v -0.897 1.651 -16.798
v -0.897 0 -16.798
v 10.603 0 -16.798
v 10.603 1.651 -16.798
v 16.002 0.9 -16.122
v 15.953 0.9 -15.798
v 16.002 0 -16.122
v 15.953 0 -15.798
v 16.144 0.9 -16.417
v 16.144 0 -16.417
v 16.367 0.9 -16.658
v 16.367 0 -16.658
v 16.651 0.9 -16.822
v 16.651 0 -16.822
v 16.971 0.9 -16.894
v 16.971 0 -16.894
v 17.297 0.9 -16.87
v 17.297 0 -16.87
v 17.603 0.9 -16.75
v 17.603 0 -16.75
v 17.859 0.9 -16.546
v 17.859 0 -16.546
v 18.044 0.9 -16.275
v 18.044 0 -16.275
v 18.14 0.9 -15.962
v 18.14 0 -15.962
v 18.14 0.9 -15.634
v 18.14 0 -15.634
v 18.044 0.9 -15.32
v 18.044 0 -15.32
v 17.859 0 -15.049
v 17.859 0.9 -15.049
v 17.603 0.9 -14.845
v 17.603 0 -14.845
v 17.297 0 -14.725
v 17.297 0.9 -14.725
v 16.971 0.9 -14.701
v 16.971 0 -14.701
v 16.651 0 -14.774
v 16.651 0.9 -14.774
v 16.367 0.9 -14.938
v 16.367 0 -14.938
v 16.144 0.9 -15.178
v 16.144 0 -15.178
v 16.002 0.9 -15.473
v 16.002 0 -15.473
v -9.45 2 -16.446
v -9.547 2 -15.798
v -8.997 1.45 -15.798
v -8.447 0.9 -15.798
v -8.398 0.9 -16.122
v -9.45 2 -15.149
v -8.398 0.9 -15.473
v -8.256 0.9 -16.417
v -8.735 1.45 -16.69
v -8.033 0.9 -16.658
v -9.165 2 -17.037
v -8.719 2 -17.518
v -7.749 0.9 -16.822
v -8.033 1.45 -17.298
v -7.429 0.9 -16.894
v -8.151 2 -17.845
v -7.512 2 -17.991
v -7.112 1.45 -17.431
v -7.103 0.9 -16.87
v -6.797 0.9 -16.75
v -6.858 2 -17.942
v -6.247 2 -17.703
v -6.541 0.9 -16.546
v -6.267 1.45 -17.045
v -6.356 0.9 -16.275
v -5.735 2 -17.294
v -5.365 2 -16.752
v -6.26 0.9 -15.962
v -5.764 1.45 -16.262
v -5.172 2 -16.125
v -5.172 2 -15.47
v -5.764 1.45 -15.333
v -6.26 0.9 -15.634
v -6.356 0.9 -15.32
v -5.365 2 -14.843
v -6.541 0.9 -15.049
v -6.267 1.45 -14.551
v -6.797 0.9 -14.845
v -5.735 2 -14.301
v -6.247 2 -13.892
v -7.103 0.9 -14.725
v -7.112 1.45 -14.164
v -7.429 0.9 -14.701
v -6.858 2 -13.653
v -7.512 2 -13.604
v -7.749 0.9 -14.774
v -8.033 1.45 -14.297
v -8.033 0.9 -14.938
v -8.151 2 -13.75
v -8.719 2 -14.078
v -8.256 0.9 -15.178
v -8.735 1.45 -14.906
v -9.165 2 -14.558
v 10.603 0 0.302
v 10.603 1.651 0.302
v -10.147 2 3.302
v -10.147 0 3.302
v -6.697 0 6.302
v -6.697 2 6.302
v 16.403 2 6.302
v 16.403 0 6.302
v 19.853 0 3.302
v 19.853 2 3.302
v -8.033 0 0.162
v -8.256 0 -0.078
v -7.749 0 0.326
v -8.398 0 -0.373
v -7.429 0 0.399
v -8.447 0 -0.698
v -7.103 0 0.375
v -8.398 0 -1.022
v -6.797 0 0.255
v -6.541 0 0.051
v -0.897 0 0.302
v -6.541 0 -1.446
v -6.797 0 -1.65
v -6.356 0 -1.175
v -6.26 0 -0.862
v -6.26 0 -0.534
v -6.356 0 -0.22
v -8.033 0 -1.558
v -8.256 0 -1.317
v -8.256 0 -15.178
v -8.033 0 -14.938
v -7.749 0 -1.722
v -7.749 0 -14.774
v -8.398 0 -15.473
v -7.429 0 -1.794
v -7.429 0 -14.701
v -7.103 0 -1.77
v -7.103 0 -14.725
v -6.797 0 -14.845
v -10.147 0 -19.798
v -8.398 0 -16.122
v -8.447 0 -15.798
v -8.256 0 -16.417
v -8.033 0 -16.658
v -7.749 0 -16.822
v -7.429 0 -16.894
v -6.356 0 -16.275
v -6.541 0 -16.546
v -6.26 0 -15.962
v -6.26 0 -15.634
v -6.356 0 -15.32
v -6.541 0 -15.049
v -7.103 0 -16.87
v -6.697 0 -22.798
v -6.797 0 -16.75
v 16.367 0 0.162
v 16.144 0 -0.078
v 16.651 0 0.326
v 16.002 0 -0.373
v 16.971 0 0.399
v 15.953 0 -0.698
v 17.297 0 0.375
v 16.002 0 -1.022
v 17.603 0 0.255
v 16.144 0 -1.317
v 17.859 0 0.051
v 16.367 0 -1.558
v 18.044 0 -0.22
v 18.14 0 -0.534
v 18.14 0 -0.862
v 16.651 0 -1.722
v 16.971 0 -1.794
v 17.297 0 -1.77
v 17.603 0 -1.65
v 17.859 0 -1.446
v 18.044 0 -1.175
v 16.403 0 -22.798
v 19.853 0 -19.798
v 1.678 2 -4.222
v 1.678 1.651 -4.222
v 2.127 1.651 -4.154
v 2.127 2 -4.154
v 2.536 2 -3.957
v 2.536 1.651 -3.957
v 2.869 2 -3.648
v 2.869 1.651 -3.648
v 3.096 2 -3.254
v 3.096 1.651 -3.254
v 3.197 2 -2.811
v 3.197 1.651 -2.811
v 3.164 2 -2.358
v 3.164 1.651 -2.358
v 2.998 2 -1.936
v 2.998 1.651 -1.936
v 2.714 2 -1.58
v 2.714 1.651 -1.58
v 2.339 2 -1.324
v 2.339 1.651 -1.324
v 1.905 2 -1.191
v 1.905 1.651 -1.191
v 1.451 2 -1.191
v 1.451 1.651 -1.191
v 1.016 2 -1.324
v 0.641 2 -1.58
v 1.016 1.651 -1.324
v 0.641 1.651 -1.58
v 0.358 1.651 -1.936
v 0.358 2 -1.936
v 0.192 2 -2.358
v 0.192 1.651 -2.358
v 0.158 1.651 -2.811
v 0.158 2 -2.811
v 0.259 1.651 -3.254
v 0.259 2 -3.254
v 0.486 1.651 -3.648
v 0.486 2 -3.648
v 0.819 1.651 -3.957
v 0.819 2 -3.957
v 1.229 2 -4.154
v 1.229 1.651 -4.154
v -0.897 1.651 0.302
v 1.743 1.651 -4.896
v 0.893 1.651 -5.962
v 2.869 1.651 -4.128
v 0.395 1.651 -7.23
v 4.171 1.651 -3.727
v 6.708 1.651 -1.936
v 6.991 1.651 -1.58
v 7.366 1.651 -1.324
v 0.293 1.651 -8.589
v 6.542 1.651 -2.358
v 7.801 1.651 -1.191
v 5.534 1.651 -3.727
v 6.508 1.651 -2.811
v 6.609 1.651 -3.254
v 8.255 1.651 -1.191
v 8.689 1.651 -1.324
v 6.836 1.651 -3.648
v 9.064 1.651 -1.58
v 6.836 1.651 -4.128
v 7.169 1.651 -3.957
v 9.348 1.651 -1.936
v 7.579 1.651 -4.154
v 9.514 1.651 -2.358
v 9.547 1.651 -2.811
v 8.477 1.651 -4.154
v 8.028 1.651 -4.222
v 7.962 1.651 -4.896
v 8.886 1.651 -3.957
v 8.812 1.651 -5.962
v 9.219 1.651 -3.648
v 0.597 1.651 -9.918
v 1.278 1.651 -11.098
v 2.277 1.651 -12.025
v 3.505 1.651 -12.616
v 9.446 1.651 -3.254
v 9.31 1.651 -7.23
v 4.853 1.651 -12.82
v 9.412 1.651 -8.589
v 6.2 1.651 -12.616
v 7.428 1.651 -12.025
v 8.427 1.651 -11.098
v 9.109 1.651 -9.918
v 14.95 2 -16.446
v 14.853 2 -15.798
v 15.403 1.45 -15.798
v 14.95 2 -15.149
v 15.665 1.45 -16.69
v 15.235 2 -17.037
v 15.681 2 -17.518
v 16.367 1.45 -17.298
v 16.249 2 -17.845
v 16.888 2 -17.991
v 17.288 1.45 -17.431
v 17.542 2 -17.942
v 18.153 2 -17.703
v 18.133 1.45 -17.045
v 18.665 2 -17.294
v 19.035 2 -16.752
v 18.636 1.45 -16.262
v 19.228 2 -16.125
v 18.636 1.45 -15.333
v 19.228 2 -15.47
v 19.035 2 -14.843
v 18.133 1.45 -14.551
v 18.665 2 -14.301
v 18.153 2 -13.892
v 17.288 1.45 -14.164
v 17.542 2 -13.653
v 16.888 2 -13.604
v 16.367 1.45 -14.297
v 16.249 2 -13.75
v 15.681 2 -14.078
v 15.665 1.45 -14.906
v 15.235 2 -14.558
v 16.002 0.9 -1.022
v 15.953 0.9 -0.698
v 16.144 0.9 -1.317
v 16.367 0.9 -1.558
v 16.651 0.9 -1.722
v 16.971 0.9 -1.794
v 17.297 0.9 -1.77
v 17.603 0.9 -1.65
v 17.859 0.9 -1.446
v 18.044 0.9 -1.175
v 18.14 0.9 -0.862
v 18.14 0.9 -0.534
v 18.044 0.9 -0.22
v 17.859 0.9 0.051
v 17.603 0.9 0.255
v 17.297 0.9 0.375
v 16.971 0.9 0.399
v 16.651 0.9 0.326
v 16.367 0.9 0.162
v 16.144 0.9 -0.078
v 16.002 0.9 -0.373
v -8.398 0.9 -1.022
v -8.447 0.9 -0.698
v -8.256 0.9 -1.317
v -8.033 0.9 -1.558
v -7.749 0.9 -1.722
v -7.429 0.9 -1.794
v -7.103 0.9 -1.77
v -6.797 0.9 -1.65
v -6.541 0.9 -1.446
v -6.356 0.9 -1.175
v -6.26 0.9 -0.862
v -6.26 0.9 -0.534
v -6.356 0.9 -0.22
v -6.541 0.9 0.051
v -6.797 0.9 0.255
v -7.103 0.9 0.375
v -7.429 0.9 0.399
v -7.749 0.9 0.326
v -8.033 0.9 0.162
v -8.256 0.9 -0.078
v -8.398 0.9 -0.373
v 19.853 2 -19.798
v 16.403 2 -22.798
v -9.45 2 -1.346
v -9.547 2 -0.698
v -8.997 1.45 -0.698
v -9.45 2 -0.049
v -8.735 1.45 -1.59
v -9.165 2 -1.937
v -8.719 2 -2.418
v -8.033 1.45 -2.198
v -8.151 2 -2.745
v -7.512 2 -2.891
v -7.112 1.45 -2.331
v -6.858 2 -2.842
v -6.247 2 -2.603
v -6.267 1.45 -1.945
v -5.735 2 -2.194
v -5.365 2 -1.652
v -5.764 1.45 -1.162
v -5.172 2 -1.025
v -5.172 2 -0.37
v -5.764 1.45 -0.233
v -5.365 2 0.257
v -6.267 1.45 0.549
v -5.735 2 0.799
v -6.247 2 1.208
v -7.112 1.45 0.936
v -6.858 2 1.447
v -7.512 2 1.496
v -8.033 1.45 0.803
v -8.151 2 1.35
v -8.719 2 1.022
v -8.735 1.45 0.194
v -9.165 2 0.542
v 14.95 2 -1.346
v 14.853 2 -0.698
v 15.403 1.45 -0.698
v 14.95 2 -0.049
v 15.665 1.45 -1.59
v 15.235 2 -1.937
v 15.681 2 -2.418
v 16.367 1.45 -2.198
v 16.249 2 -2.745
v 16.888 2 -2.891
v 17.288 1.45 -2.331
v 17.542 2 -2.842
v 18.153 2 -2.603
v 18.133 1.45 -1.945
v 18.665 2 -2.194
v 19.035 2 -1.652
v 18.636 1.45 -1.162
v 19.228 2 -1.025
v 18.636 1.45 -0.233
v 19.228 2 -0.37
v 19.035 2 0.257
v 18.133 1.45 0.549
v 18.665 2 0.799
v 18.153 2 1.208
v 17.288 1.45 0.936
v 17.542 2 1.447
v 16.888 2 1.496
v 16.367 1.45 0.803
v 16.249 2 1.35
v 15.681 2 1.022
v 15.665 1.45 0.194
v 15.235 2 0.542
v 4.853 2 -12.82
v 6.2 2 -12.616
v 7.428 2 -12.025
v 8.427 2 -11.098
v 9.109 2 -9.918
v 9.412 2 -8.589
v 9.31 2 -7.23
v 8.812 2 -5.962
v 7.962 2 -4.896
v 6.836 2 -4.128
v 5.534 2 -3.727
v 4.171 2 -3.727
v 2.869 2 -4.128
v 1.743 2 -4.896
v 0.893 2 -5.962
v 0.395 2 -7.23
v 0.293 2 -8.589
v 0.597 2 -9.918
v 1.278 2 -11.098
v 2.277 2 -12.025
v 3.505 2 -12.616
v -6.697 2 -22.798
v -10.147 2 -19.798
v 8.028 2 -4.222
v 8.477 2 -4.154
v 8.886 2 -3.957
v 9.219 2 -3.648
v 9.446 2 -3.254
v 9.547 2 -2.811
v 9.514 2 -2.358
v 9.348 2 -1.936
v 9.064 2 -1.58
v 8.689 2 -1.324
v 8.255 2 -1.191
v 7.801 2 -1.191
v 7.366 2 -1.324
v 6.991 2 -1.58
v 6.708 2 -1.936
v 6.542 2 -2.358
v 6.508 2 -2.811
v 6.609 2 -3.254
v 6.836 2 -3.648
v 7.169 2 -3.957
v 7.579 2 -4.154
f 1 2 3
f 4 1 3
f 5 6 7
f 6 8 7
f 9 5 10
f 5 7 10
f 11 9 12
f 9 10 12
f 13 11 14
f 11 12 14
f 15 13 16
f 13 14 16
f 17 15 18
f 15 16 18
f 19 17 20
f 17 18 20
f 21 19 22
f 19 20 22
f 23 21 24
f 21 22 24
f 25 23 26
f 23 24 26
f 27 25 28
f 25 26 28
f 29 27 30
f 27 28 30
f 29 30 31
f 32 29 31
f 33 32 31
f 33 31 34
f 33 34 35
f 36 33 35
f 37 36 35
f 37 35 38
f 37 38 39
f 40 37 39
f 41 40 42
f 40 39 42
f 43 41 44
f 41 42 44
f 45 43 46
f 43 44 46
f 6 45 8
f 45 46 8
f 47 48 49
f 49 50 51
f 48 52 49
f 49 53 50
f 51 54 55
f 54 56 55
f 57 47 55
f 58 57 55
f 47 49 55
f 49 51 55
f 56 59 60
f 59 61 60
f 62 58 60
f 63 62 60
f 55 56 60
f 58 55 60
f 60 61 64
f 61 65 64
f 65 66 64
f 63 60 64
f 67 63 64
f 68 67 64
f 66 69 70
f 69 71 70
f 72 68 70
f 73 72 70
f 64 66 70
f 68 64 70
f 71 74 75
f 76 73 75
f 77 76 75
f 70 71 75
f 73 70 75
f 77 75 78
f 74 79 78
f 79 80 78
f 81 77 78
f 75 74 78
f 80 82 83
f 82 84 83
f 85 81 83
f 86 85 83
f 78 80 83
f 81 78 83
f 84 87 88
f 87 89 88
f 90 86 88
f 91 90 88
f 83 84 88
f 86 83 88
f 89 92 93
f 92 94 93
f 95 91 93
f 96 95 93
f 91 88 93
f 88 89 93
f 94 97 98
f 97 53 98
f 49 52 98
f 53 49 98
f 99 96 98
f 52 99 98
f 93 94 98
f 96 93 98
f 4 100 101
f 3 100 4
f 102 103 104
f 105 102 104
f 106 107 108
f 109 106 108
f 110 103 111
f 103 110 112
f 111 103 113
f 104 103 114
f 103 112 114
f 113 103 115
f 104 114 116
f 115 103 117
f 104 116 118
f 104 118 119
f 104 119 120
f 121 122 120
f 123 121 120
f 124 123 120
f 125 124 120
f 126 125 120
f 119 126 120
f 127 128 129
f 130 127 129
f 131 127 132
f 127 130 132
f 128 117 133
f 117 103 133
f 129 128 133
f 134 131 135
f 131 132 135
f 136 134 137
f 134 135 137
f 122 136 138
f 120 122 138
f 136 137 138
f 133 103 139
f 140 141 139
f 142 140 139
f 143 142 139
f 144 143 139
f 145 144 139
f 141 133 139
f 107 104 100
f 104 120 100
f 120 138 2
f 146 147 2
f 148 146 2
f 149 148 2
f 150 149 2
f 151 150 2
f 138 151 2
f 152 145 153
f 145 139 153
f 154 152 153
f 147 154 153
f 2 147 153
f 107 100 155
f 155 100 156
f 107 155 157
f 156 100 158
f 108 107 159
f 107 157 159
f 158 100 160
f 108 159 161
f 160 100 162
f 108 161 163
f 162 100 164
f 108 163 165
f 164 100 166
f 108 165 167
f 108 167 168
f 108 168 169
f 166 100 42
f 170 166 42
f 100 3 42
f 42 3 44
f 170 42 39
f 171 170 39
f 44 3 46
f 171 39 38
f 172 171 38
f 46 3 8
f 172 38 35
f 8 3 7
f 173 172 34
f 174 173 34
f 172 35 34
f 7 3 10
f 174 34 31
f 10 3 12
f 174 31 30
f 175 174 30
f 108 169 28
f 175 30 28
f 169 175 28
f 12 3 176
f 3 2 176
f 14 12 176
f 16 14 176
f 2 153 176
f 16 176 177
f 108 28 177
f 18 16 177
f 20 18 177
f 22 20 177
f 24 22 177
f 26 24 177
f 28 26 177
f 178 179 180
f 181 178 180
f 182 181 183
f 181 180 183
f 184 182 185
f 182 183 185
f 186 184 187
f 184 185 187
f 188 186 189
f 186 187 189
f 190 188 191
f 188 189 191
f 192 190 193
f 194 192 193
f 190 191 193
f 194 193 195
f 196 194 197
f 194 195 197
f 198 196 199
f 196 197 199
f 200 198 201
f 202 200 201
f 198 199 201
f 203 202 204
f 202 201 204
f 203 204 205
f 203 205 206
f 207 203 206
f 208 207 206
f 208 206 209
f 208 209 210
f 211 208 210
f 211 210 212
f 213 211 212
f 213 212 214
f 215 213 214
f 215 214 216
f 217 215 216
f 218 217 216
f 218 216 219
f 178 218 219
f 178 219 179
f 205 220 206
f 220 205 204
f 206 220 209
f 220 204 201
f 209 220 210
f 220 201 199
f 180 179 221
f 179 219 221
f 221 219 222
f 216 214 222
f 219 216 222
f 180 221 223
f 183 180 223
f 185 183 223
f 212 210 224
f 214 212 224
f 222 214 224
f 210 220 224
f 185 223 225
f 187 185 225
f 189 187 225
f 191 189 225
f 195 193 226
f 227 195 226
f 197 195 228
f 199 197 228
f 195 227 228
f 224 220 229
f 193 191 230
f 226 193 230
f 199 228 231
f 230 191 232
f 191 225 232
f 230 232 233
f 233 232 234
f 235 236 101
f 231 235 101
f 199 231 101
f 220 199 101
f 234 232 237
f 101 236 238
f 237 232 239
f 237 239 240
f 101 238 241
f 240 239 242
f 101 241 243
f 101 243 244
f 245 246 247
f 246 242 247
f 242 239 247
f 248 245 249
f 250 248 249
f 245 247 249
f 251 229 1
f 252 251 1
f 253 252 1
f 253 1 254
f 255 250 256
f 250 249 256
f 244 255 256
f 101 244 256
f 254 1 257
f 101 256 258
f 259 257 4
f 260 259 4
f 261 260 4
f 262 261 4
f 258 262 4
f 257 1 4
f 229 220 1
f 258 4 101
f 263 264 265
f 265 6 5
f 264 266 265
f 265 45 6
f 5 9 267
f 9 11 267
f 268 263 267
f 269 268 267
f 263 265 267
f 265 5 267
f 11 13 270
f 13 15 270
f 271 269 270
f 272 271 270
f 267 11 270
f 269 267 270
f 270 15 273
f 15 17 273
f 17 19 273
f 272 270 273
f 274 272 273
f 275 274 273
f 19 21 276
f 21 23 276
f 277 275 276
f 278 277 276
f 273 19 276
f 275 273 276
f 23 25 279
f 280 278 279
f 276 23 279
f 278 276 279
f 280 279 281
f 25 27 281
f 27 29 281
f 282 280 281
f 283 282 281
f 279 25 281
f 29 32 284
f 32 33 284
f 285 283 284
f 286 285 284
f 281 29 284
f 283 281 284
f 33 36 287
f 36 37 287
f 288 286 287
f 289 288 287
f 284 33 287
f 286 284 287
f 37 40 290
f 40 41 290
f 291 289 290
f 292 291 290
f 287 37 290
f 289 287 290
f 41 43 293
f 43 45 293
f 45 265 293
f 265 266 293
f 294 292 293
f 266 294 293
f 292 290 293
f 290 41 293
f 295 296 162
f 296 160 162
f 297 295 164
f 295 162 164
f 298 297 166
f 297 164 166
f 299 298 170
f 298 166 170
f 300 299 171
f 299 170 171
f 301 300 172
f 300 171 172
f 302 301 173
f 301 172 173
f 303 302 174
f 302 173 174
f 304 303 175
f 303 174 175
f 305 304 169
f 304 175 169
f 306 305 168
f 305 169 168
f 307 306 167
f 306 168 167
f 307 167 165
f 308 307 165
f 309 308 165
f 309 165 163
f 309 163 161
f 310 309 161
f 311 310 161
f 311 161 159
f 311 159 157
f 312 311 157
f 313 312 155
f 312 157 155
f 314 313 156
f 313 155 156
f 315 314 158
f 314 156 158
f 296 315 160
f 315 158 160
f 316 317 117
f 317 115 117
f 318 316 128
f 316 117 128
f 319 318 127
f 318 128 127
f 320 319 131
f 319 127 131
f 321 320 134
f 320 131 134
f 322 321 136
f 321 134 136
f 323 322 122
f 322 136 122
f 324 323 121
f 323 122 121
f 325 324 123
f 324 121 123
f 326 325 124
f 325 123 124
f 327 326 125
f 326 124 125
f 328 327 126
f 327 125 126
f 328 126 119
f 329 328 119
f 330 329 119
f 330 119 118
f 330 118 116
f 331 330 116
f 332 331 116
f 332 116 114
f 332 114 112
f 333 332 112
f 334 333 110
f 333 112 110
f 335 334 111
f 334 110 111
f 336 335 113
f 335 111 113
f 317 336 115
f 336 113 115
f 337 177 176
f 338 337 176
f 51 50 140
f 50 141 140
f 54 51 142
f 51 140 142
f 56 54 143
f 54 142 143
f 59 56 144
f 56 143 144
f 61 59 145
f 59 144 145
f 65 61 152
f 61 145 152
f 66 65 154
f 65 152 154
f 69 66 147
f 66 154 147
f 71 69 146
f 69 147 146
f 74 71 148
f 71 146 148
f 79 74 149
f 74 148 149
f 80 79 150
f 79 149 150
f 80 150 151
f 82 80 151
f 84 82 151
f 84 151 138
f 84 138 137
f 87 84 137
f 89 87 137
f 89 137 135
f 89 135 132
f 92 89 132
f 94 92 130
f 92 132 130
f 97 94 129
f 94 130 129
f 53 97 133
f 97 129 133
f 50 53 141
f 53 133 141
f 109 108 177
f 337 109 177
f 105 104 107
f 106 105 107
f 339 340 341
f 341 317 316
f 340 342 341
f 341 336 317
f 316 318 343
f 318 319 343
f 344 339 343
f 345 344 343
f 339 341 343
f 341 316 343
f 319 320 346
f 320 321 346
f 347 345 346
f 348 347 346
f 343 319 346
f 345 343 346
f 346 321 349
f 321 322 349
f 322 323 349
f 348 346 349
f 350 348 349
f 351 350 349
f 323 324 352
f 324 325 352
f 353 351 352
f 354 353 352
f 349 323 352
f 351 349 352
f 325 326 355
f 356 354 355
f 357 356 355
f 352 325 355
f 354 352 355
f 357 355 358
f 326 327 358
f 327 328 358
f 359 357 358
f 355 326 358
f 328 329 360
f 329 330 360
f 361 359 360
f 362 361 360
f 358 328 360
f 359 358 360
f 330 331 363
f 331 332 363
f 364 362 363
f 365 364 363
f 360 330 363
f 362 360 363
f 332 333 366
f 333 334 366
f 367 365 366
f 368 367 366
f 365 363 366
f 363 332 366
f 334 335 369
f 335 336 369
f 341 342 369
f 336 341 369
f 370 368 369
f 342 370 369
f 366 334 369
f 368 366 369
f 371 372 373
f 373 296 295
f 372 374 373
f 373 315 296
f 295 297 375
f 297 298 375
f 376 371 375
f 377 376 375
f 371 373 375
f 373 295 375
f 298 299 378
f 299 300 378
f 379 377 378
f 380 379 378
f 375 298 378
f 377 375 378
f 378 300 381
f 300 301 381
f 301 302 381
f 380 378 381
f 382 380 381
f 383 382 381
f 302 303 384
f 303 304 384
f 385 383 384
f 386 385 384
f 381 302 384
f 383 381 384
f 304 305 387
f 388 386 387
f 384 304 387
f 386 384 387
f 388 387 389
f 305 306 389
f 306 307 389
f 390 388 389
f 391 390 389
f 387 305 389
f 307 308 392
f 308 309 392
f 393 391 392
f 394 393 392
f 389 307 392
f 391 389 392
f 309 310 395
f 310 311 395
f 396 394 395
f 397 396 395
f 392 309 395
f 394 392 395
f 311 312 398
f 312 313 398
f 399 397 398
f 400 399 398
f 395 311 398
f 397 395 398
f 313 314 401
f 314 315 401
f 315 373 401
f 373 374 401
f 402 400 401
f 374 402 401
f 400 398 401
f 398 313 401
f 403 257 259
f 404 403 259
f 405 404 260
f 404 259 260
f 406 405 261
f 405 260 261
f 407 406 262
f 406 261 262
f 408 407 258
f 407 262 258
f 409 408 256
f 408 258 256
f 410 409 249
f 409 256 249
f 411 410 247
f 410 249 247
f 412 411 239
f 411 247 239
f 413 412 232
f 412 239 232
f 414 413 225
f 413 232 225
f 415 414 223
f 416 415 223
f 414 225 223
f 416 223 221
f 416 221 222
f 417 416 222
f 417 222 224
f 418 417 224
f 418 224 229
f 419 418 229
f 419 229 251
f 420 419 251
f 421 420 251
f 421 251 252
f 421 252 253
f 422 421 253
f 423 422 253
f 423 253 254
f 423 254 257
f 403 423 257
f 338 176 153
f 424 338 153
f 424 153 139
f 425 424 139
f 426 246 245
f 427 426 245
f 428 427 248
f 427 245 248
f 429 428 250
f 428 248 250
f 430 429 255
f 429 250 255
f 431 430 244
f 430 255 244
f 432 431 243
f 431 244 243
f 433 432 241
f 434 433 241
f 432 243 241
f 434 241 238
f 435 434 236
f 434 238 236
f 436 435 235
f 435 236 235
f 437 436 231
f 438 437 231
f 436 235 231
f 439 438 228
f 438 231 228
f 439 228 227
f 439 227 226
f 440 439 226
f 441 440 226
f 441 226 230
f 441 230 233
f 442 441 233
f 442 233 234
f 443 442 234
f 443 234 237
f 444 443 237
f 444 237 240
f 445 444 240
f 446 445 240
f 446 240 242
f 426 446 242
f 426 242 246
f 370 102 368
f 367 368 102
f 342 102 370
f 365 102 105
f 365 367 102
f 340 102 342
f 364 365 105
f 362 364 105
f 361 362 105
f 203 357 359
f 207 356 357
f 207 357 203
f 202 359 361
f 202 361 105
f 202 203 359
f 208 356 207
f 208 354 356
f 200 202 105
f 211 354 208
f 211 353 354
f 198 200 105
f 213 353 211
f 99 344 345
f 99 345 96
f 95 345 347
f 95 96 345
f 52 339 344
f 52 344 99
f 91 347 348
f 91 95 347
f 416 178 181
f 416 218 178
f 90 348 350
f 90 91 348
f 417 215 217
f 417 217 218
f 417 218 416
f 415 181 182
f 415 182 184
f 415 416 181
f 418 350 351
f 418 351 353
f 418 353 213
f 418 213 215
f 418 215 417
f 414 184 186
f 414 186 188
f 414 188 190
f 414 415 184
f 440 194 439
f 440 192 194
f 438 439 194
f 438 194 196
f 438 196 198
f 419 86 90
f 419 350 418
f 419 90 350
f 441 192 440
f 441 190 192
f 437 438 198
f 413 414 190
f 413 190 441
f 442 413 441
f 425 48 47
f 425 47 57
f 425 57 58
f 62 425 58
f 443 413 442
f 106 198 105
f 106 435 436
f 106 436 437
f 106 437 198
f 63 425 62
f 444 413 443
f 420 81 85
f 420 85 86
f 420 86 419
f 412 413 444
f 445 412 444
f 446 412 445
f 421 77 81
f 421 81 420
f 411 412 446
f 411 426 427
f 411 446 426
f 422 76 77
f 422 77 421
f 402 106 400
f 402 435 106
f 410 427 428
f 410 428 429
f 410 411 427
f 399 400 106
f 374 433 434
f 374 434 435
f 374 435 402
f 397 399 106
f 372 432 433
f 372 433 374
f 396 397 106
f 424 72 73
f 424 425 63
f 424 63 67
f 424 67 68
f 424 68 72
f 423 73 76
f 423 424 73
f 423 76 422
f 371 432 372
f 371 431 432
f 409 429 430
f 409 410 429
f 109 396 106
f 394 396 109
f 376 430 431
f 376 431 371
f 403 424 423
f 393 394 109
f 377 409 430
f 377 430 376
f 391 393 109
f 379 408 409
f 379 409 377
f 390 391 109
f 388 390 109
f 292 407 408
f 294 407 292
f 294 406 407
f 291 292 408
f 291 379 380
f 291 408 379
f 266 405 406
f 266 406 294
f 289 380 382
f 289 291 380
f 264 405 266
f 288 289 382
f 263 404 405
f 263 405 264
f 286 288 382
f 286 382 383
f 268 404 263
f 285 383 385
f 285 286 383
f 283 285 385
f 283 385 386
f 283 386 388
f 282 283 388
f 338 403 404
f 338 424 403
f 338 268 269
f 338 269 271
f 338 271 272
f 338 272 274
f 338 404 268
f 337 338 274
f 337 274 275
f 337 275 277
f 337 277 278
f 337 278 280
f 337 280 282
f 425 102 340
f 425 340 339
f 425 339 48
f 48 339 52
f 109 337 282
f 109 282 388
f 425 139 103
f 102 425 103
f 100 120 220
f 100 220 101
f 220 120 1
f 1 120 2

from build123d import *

# Parameters (mm, degrees)
BOSS_EXTRUDE1_DEPTH                             = 2
CSK_FOR_M2_FLAT_HEAD_MACHINE_SCREW1_D           = 2.2
CSK_FOR_M2_FLAT_HEAD_MACHINE_SCREW1_DEPTH       = 4
CSK_FOR_M2_FLAT_HEAD_MACHINE_SCREW1_CSINK_D     = 4.4
CSK_FOR_M2_FLAT_HEAD_MACHINE_SCREW1_CSINK_ANGLE = 90
CSK_FOR_M2_FLAT_HEAD_MACHINE_SCREW1_TIP         = 0.660946681
SKETCH9_W                                       = 11.5
SKETCH9_H                                       = 17.1
CUT_EXTRUDE1_DEPTH                              = 1.651
SKETCH11_R                                      = 4.572
SKETCH11_R_2                                    = 1.524
CUT_EXTRUDE2_DEPTH                              = 31.275155769


with BuildPart() as part:
    # Sketch1 → Boss-Extrude1 (new body)
    with BuildSketch(Plane(origin=(0, 0, 0), x_dir=(1, 0, 0), z_dir=(0, 1, 0))):
        Polygon((-10.147286186, 19.79756588), (-10.147286186, -3.30243412), (-6.697286186, -6.30243412), (16.402713814, -6.30243412), (19.852713814, -3.30243412), (19.852713814, 19.79756588), (16.402713814, 22.79756588), (-6.697286186, 22.79756588), align=None)
    extrude(amount=BOSS_EXTRUDE1_DEPTH)

    # CSK for M2 Flat Head Machine Screw1
    with Locations(Plane(origin=(0, 2, 0), x_dir=(1, 0, 0), z_dir=(0, 1, 0))):
        with Locations((-7.347286186, 15.79756588), (17.052713814, 15.79756588), (17.052713814, 0.69756588), (-7.347286186, 0.69756588)):
            CounterSinkHole(CSK_FOR_M2_FLAT_HEAD_MACHINE_SCREW1_D / 2, CSK_FOR_M2_FLAT_HEAD_MACHINE_SCREW1_CSINK_D / 2, depth=CSK_FOR_M2_FLAT_HEAD_MACHINE_SCREW1_DEPTH, counter_sink_angle=CSK_FOR_M2_FLAT_HEAD_MACHINE_SCREW1_CSINK_ANGLE)
            with Locations((0, 0, -(CSK_FOR_M2_FLAT_HEAD_MACHINE_SCREW1_DEPTH + CSK_FOR_M2_FLAT_HEAD_MACHINE_SCREW1_TIP / 2))):  # 118° drill point
                Cone(0, CSK_FOR_M2_FLAT_HEAD_MACHINE_SCREW1_D / 2, CSK_FOR_M2_FLAT_HEAD_MACHINE_SCREW1_TIP, mode=Mode.SUBTRACT)

    # Sketch9 → Cut-Extrude1 (cut)
    with BuildSketch(Plane(origin=(0, 0, 0), x_dir=(1, 0, 0), z_dir=(0, 1, 0))):
        with Locations((4.852713814, 8.24756588)):
            Rectangle(SKETCH9_W, SKETCH9_H)
    extrude(amount=CUT_EXTRUDE1_DEPTH, mode=Mode.SUBTRACT)

    # Sketch11 → Cut-Extrude2 (cut, through all)
    with BuildSketch(Plane.XZ.offset(-1.651)):
        with Locations(Location((4.852713814, -8.24756588, 0), (0, 0, 270))):
            Circle(SKETCH11_R)
        with Locations(Location((8.027713814, -2.69756588, 0), (0, 0, 270))):
            Circle(SKETCH11_R_2)
        with Locations(Location((1.677713814, -2.69756588, 0), (0, 0, 270))):
            Circle(SKETCH11_R_2)
    extrude(amount=-CUT_EXTRUDE2_DEPTH, mode=Mode.SUBTRACT)


solid = part.part
